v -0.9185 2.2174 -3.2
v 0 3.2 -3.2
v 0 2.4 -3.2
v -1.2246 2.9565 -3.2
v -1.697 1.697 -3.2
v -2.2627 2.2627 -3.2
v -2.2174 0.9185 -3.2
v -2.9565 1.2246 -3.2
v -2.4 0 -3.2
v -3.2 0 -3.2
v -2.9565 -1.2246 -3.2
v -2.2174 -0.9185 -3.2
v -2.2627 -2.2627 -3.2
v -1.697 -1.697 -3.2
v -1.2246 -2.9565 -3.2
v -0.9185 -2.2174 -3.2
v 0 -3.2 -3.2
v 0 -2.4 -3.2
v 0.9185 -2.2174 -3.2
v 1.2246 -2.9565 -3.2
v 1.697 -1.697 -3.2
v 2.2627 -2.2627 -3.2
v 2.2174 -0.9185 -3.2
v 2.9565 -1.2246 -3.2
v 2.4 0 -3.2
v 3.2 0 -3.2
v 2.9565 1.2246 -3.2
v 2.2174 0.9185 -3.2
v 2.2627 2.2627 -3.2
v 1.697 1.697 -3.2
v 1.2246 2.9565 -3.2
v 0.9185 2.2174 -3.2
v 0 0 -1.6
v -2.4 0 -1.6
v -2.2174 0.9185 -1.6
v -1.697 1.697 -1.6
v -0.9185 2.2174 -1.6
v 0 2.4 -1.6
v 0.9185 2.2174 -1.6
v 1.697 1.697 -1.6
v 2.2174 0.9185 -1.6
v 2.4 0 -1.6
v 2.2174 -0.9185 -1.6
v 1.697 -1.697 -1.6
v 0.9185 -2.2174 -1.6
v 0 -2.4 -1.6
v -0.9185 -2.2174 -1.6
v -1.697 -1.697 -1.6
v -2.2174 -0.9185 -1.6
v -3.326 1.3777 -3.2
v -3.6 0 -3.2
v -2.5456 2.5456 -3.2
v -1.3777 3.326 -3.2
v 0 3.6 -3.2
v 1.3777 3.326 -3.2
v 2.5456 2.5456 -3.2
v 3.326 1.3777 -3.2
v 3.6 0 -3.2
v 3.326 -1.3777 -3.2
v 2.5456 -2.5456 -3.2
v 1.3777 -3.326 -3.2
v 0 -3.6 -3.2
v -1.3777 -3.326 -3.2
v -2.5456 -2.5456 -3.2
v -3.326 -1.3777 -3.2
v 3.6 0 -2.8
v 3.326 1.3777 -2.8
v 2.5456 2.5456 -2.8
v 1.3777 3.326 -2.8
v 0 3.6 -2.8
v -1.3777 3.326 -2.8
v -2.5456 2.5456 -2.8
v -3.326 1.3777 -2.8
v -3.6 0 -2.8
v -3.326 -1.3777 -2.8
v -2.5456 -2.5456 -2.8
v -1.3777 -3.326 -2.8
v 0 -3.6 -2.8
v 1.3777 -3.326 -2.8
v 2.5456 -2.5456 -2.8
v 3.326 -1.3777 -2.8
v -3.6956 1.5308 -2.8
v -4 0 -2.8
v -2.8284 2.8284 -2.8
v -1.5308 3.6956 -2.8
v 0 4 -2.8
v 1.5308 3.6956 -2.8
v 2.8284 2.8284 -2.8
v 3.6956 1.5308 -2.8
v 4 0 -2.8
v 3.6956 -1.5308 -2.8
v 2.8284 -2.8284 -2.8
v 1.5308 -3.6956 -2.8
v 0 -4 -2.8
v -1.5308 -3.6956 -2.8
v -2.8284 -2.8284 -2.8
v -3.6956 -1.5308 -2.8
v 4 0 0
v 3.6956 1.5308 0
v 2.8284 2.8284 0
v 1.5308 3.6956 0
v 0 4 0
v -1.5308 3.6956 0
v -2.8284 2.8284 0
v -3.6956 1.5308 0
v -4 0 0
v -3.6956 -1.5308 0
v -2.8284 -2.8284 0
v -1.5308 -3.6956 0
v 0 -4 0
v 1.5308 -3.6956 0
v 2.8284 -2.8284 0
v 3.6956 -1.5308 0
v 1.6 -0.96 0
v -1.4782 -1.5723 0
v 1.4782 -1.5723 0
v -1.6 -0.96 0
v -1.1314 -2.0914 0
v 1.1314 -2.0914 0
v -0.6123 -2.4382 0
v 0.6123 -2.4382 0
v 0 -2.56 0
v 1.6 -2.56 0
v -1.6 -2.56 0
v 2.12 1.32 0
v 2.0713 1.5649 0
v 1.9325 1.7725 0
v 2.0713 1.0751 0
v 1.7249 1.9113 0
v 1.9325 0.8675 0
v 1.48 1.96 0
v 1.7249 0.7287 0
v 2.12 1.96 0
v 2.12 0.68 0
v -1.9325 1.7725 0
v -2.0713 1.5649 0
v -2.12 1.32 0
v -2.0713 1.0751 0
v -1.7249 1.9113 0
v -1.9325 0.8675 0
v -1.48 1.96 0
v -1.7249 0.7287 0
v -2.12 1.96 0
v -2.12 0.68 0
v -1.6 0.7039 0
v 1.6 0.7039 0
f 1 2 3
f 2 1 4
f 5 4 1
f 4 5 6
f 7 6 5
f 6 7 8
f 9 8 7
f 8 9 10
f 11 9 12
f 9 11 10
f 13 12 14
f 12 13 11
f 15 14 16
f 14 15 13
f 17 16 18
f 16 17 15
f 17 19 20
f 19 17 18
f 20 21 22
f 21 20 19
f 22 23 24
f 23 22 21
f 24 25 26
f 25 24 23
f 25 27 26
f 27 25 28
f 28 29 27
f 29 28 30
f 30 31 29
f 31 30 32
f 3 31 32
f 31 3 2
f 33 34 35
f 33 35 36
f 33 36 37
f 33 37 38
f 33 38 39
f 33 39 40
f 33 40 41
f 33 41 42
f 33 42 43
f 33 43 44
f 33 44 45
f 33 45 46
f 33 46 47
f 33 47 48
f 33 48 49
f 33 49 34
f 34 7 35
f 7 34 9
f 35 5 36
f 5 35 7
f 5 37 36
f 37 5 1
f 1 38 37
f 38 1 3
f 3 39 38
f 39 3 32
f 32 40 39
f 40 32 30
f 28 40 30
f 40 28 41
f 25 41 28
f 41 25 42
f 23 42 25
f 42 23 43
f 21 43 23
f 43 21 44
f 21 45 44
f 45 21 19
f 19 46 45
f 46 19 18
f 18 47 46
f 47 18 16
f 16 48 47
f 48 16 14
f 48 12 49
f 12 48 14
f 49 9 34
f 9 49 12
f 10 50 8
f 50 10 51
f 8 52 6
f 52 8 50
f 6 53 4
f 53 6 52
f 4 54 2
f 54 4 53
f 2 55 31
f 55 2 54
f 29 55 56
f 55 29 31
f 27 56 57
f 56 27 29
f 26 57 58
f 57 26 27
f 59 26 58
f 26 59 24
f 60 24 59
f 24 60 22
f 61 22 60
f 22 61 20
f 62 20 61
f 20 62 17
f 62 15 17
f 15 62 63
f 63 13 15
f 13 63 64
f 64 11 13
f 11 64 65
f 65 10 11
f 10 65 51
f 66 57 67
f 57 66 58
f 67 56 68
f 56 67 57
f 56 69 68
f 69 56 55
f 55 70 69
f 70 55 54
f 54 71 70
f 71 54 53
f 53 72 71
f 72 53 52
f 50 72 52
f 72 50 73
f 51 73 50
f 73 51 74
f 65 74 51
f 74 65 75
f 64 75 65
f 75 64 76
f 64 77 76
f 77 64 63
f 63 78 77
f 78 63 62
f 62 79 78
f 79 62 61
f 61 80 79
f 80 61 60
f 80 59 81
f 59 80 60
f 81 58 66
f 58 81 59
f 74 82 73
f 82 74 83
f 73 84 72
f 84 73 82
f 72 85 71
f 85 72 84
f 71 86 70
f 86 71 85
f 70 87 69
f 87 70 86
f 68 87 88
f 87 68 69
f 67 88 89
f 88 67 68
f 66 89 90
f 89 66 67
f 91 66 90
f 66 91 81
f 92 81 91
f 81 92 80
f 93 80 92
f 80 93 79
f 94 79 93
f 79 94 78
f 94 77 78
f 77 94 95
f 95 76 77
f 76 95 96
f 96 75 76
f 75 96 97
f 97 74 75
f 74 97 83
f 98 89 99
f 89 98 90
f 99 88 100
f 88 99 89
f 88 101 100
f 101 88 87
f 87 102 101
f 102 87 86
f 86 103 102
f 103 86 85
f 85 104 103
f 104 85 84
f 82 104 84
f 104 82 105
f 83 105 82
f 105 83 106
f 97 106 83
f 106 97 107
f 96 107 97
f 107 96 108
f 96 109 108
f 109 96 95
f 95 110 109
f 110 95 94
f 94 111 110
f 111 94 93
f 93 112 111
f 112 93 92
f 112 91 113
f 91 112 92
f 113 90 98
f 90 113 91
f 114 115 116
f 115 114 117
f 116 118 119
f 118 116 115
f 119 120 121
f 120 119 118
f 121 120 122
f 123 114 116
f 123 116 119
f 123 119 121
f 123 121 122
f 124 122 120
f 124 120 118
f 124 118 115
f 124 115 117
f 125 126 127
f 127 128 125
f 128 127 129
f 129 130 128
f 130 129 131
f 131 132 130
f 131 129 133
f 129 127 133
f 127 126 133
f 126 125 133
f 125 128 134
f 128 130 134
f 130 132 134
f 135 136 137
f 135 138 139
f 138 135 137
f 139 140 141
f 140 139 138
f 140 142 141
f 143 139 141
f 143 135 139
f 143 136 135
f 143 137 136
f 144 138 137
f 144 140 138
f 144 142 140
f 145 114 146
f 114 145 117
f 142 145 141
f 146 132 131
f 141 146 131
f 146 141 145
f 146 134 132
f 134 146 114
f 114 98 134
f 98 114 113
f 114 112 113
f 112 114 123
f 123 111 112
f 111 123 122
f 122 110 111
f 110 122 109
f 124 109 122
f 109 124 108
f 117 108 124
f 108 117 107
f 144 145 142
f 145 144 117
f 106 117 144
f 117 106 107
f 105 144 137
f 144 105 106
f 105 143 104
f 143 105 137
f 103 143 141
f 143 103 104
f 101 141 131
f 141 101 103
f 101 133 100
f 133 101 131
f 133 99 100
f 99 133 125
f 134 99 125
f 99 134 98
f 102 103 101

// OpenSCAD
// file: ../p/4-4disc.scad
use <../lib.scad>
function ldraw_lib__4_4disc() = [
// 0 Disc 1.0
// 0 Name: 4-4disc.dat
// 0 Author: James Jessiman
// 0 !LDRAW_ORG Primitive UPDATE 2002-02
// 0 !LICENSE Licensed under CC BY 2.0 and CC BY 4.0 : see CAreadme.txt
// 
// 0 BFC CERTIFY CCW
  [0,"BFC","CERTIFY"],
  [0,"BFC","CCW"],
// 
// 0 !HISTORY 1998-12-15 [PTadmin] Official Update 1998-10
// 0 !HISTORY 2002-03-23 [sbliss] Added BFC statement
// 0 !HISTORY 2002-04-25 [PTadmin] Official Update 2002-02
// 0 !HISTORY 2007-06-24 [PTadmin] Header formatted for Contributor Agreement
// 0 !HISTORY 2008-07-01 [PTadmin] Official Update 2008-01
// 
// 
// 3 16 0 0 0 1 0 0 0.9239 0 0.3827
  [3,16,0,0,0,1,0,0,0.9239,0,0.3827],
// 3 16 0 0 0 0.9239 0 0.3827 0.7071 0 0.7071
  [3,16,0,0,0,0.9239,0,0.3827,0.7071,0,0.7071],
// 3 16 0 0 0 0.7071 0 0.7071 0.3827 0 0.9239
  [3,16,0,0,0,0.7071,0,0.7071,0.3827,0,0.9239],
// 3 16 0 0 0 0.3827 0 0.9239 0 0 1
  [3,16,0,0,0,0.3827,0,0.9239,0,0,1],
// 3 16 0 0 0 0 0 1 -0.3827 0 0.9239
  [3,16,0,0,0,0,0,1,-0.3827,0,0.9239],
// 3 16 0 0 0 -0.3827 0 0.9239 -0.7071 0 0.7071
  [3,16,0,0,0,-0.3827,0,0.9239,-0.7071,0,0.7071],
// 3 16 0 0 0 -0.7071 0 0.7071 -0.9239 0 0.3827
  [3,16,0,0,0,-0.7071,0,0.7071,-0.9239,0,0.3827],
// 3 16 0 0 0 -0.9239 0 0.3827 -1 0 -0
  [3,16,0,0,0,-0.9239,0,0.3827,-1,0,-0],
// 3 16 0 0 0 -1 0 -0 -0.9239 0 -0.3827
  [3,16,0,0,0,-1,0,-0,-0.9239,0,-0.3827],
// 3 16 0 0 0 -0.9239 0 -0.3827 -0.7071 0 -0.7071
  [3,16,0,0,0,-0.9239,0,-0.3827,-0.7071,0,-0.7071],
// 3 16 0 0 0 -0.7071 0 -0.7071 -0.3827 0 -0.9239
  [3,16,0,0,0,-0.7071,0,-0.7071,-0.3827,0,-0.9239],
// 3 16 0 0 0 -0.3827 0 -0.9239 0 0 -1
  [3,16,0,0,0,-0.3827,0,-0.9239,0,0,-1],
// 3 16 0 0 0 0 0 -1 0.3827 0 -0.9239
  [3,16,0,0,0,0,0,-1,0.3827,0,-0.9239],
// 3 16 0 0 0 0.3827 0 -0.9239 0.7071 0 -0.7071
  [3,16,0,0,0,0.3827,0,-0.9239,0.7071,0,-0.7071],
// 3 16 0 0 0 0.7071 0 -0.7071 0.9239 0 -0.3827
  [3,16,0,0,0,0.7071,0,-0.7071,0.9239,0,-0.3827],
// 3 16 0 0 0 0.9239 0 -0.3827 1 0 0
  [3,16,0,0,0,0.9239,0,-0.3827,1,0,0],
// 0
];
makepoly(ldraw_lib__4_4disc(), line=0.2);
// file: ../p/4-4ring3.scad
use <../lib.scad>
function ldraw_lib__4_4ring3() = [
// 0 Ring  3 x 1.0
// 0 Name: 4-4ring3.dat
// 0 Author: James Jessiman
// 0 !LDRAW_ORG Primitive UPDATE 2009-01
// 0 !LICENSE Licensed under CC BY 2.0 and CC BY 4.0 : see CAreadme.txt
// 
// 0 BFC CERTIFY CCW
  [0,"BFC","CERTIFY"],
  [0,"BFC","CCW"],
// 
// 0 !HISTORY 1998-12-15 [PTadmin] Official Update 1998-10
// 0 !HISTORY 2002-04-05 [hafhead] Added BFC statement
// 0 !HISTORY 2002-04-25 [PTadmin] Official Update 2002-02
// 0 !HISTORY 2007-06-24 [PTadmin] Header formatted for Contributor Agreement
// 0 !HISTORY 2008-07-01 [PTadmin] Official Update 2008-01
// 0 !HISTORY 2008-08-26 [cwdee] Switch polygon winding and rename
// 0 !HISTORY 2009-05-02 [PTadmin] Official Update 2009-01
// 
// 
// 4 16 -1.5308 0 3.6956 -1.1481 0 2.7717 0 0 3 0 0 4
  [4,16,-1.5308,0,3.6956,-1.1481,0,2.7717,0,0,3,0,0,4],
// 4 16 -2.8284 0 2.8284 -2.1213 0 2.1213 -1.1481 0 2.7717 -1.5308 0 3.6956
  [4,16,-2.8284,0,2.8284,-2.1213,0,2.1213,-1.1481,0,2.7717,-1.5308,0,3.6956],
// 4 16 -3.6956 0 1.5308 -2.7717 0 1.1481 -2.1213 0 2.1213 -2.8284 0 2.8284
  [4,16,-3.6956,0,1.5308,-2.7717,0,1.1481,-2.1213,0,2.1213,-2.8284,0,2.8284],
// 4 16 -4 0 0 -3 0 0 -2.7717 0 1.1481 -3.6956 0 1.5308
  [4,16,-4,0,0,-3,0,0,-2.7717,0,1.1481,-3.6956,0,1.5308],
// 4 16 -3.6956 0 -1.5308 -2.7717 0 -1.1481 -3 0 0 -4 0 0
  [4,16,-3.6956,0,-1.5308,-2.7717,0,-1.1481,-3,0,0,-4,0,0],
// 4 16 -2.8284 0 -2.8284 -2.1213 0 -2.1213 -2.7717 0 -1.1481 -3.6956 0 -1.5308
  [4,16,-2.8284,0,-2.8284,-2.1213,0,-2.1213,-2.7717,0,-1.1481,-3.6956,0,-1.5308],
// 4 16 -1.5308 0 -3.6956 -1.1481 0 -2.7717 -2.1213 0 -2.1213 -2.8284 0 -2.8284
  [4,16,-1.5308,0,-3.6956,-1.1481,0,-2.7717,-2.1213,0,-2.1213,-2.8284,0,-2.8284],
// 4 16 0 0 -4 0 0 -3 -1.1481 0 -2.7717 -1.5308 0 -3.6956
  [4,16,0,0,-4,0,0,-3,-1.1481,0,-2.7717,-1.5308,0,-3.6956],
// 4 16 1.5308 0 -3.6956 1.1481 0 -2.7717 0 0 -3 0 0 -4
  [4,16,1.5308,0,-3.6956,1.1481,0,-2.7717,0,0,-3,0,0,-4],
// 4 16 2.8284 0 -2.8284 2.1213 0 -2.1213 1.1481 0 -2.7717 1.5308 0 -3.6956
  [4,16,2.8284,0,-2.8284,2.1213,0,-2.1213,1.1481,0,-2.7717,1.5308,0,-3.6956],
// 4 16 3.6956 0 -1.5308 2.7717 0 -1.1481 2.1213 0 -2.1213 2.8284 0 -2.8284
  [4,16,3.6956,0,-1.5308,2.7717,0,-1.1481,2.1213,0,-2.1213,2.8284,0,-2.8284],
// 4 16 4 0 0 3 0 0 2.7717 0 -1.1481 3.6956 0 -1.5308
  [4,16,4,0,0,3,0,0,2.7717,0,-1.1481,3.6956,0,-1.5308],
// 4 16 3.6956 0 1.5308 2.7717 0 1.1481 3 0 0 4 0 0
  [4,16,3.6956,0,1.5308,2.7717,0,1.1481,3,0,0,4,0,0],
// 4 16 2.8284 0 2.8284 2.1213 0 2.1213 2.7717 0 1.1481 3.6956 0 1.5308
  [4,16,2.8284,0,2.8284,2.1213,0,2.1213,2.7717,0,1.1481,3.6956,0,1.5308],
// 4 16 1.5308 0 3.6956 1.1481 0 2.7717 2.1213 0 2.1213 2.8284 0 2.8284
  [4,16,1.5308,0,3.6956,1.1481,0,2.7717,2.1213,0,2.1213,2.8284,0,2.8284],
// 4 16 0 0 4 0 0 3 1.1481 0 2.7717 1.5308 0 3.6956
  [4,16,0,0,4,0,0,3,1.1481,0,2.7717,1.5308,0,3.6956],
// 0
];
makepoly(ldraw_lib__4_4ring3(), line=0.2);
// file: ../p/4-4cylc.scad
use <../lib.scad>
use <4-4cyli.scad>
use <4-4disc.scad>
use <4-4edge.scad>
function ldraw_lib__4_4cylc() = [
// 0 Cylinder Closed 1.0
// 0 Name: 4-4cylc.dat
// 0 Author: Alex Taylor [anathema]
// 0 !LDRAW_ORG Primitive UPDATE 2009-02
// 0 !LICENSE Licensed under CC BY 2.0 and CC BY 4.0 : see CAreadme.txt
// 
// 0 BFC CERTIFY CCW
  [0,"BFC","CERTIFY"],
  [0,"BFC","CCW"],
// 
// 0 !HISTORY 2008-12-29 [cwdee] Removed one disc
// 0 !HISTORY 2009-09-03 [PTadmin] Official Update 2009-02
// 
// 
// 1 16 0 0 0 1 0 0 0 1 0 0 0 1 4-4edge.dat
  [1,16,0,0,0,1,0,0,0,1,0,0,0,1, ldraw_lib__4_4edge()],
// 1 16 0 1 0 1 0 0 0 1 0 0 0 1 4-4edge.dat
  [1,16,0,1,0,1,0,0,0,1,0,0,0,1, ldraw_lib__4_4edge()],
// 1 16 0 0 0 1 0 0 0 1 0 0 0 1 4-4disc.dat
  [1,16,0,0,0,1,0,0,0,1,0,0,0,1, ldraw_lib__4_4disc()],
// 1 16 0 0 0 1 0 0 0 1 0 0 0 1 4-4cyli.dat
  [1,16,0,0,0,1,0,0,0,1,0,0,0,1, ldraw_lib__4_4cyli()],
// 0
];
makepoly(ldraw_lib__4_4cylc(), line=0.2);
// file: ../p/4-4edge.scad
use <../lib.scad>
function ldraw_lib__4_4edge() = [
// 0 Circle 1.0
// 0 Name: 4-4edge.dat
// 0 Author: James Jessiman
// 0 !LDRAW_ORG Primitive UPDATE 2017-01
// 0 !LICENSE Licensed under CC BY 2.0 and CC BY 4.0 : see CAreadme.txt
// 
// 0 BFC CERTIFY CCW
  [0,"BFC","CERTIFY"],
  [0,"BFC","CCW"],
// 
// 0 !HISTORY 1998-12-15 [PTadmin] Official Update 1998-10
// 0 !HISTORY 2005-12-28 [PTadmin] Official Update 2005-01
// 0 !HISTORY 2007-06-24 [PTadmin] Header formatted for Contributor Agreement
// 0 !HISTORY 2008-07-01 [PTadmin] Official Update 2008-01
// 0 !HISTORY 2017-01-15 [Steffen] BFCed
// 0 !HISTORY 2017-12-30 [PTadmin] Official Update 2017-01
// 
// 
// 2 24 1 0 0 0.9239 0 0.3827
  [2,24,1,0,0,0.9239,0,0.3827],
// 2 24 0.9239 0 0.3827 0.7071 0 0.7071
  [2,24,0.9239,0,0.3827,0.7071,0,0.7071],
// 2 24 0.7071 0 0.7071 0.3827 0 0.9239
  [2,24,0.7071,0,0.7071,0.3827,0,0.9239],
// 2 24 0.3827 0 0.9239 0 0 1
  [2,24,0.3827,0,0.9239,0,0,1],
// 2 24 0 0 1 -0.3827 0 0.9239
  [2,24,0,0,1,-0.3827,0,0.9239],
// 2 24 -0.3827 0 0.9239 -0.7071 0 0.7071
  [2,24,-0.3827,0,0.9239,-0.7071,0,0.7071],
// 2 24 -0.7071 0 0.7071 -0.9239 0 0.3827
  [2,24,-0.7071,0,0.7071,-0.9239,0,0.3827],
// 2 24 -0.9239 0 0.3827 -1 0 -0
  [2,24,-0.9239,0,0.3827,-1,0,-0],
// 2 24 -1 0 -0 -0.9239 0 -0.3827
  [2,24,-1,0,-0,-0.9239,0,-0.3827],
// 2 24 -0.9239 0 -0.3827 -0.7071 0 -0.7071
  [2,24,-0.9239,0,-0.3827,-0.7071,0,-0.7071],
// 2 24 -0.7071 0 -0.7071 -0.3827 0 -0.9239
  [2,24,-0.7071,0,-0.7071,-0.3827,0,-0.9239],
// 2 24 -0.3827 0 -0.9239 0 0 -1
  [2,24,-0.3827,0,-0.9239,0,0,-1],
// 2 24 0 0 -1 0.3827 0 -0.9239
  [2,24,0,0,-1,0.3827,0,-0.9239],
// 2 24 0.3827 0 -0.9239 0.7071 0 -0.7071
  [2,24,0.3827,0,-0.9239,0.7071,0,-0.7071],
// 2 24 0.7071 0 -0.7071 0.9239 0 -0.3827
  [2,24,0.7071,0,-0.7071,0.9239,0,-0.3827],
// 2 24 0.9239 0 -0.3827 1 0 0
  [2,24,0.9239,0,-0.3827,1,0,0],
];
makepoly(ldraw_lib__4_4edge(), line=0.2);
// file: ../p/4-4cyli.scad
use <../lib.scad>
function ldraw_lib__4_4cyli() = [
// 0 Cylinder 1.0
// 0 Name: 4-4cyli.dat
// 0 Author: James Jessiman
// 0 !LDRAW_ORG Primitive UPDATE 2005-01
// 0 !LICENSE Licensed under CC BY 2.0 and CC BY 4.0 : see CAreadme.txt
// 
// 0 BFC CERTIFY CCW
  [0,"BFC","CERTIFY"],
  [0,"BFC","CCW"],
// 
// 0 !HISTORY 1998-12-15 [PTadmin] Official Update 1998-10
// 0 !HISTORY 2002-03-23 [sbliss] Added BFC statement; merged headers from files in distributions LDraw 0.27 and Complete.
// 0 !HISTORY 2002-04-25 [PTadmin] Official Update 2002-02
// 0 !HISTORY 2004-12-14 [guyvivan] BFC CCW
// 0 !HISTORY 2005-12-28 [PTadmin] Official Update 2005-01
// 0 !HISTORY 2007-06-24 [PTadmin] Header formatted for Contributor Agreement
// 0 !HISTORY 2008-07-01 [PTadmin] Official Update 2008-01
// 
// 
// 4 16 1 1 0 0.9239 1 0.3827 0.9239 0 0.3827 1 0 0
  [4,16,1,1,0,0.9239,1,0.3827,0.9239,0,0.3827,1,0,0],
// 5 24 1 0 0 1 1 0 0.9239 0 0.3827 0.9239 0 -0.3827
  [5,24,1,0,0,1,1,0,0.9239,0,0.3827,0.9239,0,-0.3827],
// 4 16 0.9239 1 0.3827 0.7071 1 0.7071 0.7071 0 0.7071 0.9239 0 0.3827
  [4,16,0.9239,1,0.3827,0.7071,1,0.7071,0.7071,0,0.7071,0.9239,0,0.3827],
// 5 24 0.9239 0 0.3827 0.9239 1 0.3827 0.7071 0 0.7071 1 0 0
  [5,24,0.9239,0,0.3827,0.9239,1,0.3827,0.7071,0,0.7071,1,0,0],
// 4 16 0.7071 1 0.7071 0.3827 1 0.9239 0.3827 0 0.9239 0.7071 0 0.7071
  [4,16,0.7071,1,0.7071,0.3827,1,0.9239,0.3827,0,0.9239,0.7071,0,0.7071],
// 5 24 0.7071 0 0.7071 0.7071 1 0.7071 0.3827 0 0.9239 0.9239 0 0.3827
  [5,24,0.7071,0,0.7071,0.7071,1,0.7071,0.3827,0,0.9239,0.9239,0,0.3827],
// 4 16 0.3827 1 0.9239 0 1 1 0 0 1 0.3827 0 0.9239
  [4,16,0.3827,1,0.9239,0,1,1,0,0,1,0.3827,0,0.9239],
// 5 24 0.3827 0 0.9239 0.3827 1 0.9239 0 0 1 0.7071 0 0.7071
  [5,24,0.3827,0,0.9239,0.3827,1,0.9239,0,0,1,0.7071,0,0.7071],
// 4 16 0 1 1 -0.3827 1 0.9239 -0.3827 0 0.9239 0 0 1
  [4,16,0,1,1,-0.3827,1,0.9239,-0.3827,0,0.9239,0,0,1],
// 5 24 0 0 1 0 1 1 -0.3827 0 0.9239 0.3827 0 0.9239
  [5,24,0,0,1,0,1,1,-0.3827,0,0.9239,0.3827,0,0.9239],
// 4 16 -0.3827 1 0.9239 -0.7071 1 0.7071 -0.7071 0 0.7071 -0.3827 0 0.9239
  [4,16,-0.3827,1,0.9239,-0.7071,1,0.7071,-0.7071,0,0.7071,-0.3827,0,0.9239],
// 5 24 -0.3827 0 0.9239 -0.3827 1 0.9239 -0.7071 0 0.7071 0 0 1
  [5,24,-0.3827,0,0.9239,-0.3827,1,0.9239,-0.7071,0,0.7071,0,0,1],
// 4 16 -0.7071 1 0.7071 -0.9239 1 0.3827 -0.9239 0 0.3827 -0.7071 0 0.7071
  [4,16,-0.7071,1,0.7071,-0.9239,1,0.3827,-0.9239,0,0.3827,-0.7071,0,0.7071],
// 5 24 -0.7071 0 0.7071 -0.7071 1 0.7071 -0.9239 0 0.3827 -0.3827 0 0.9239
  [5,24,-0.7071,0,0.7071,-0.7071,1,0.7071,-0.9239,0,0.3827,-0.3827,0,0.9239],
// 4 16 -0.9239 1 0.3827 -1 1 0 -1 0 0 -0.9239 0 0.3827
  [4,16,-0.9239,1,0.3827,-1,1,0,-1,0,0,-0.9239,0,0.3827],
// 5 24 -0.9239 0 0.3827 -0.9239 1 0.3827 -1 0 0 -0.7071 0 0.7071
  [5,24,-0.9239,0,0.3827,-0.9239,1,0.3827,-1,0,0,-0.7071,0,0.7071],
// 4 16 -1 1 0 -0.9239 1 -0.3827 -0.9239 0 -0.3827 -1 0 0
  [4,16,-1,1,0,-0.9239,1,-0.3827,-0.9239,0,-0.3827,-1,0,0],
// 5 24 -1 0 0 -1 1 0 -0.9239 0 -0.3827 -0.9239 0 0.3827
  [5,24,-1,0,0,-1,1,0,-0.9239,0,-0.3827,-0.9239,0,0.3827],
// 4 16 -0.9239 1 -0.3827 -0.7071 1 -0.7071 -0.7071 0 -0.7071 -0.9239 0 -0.3827
  [4,16,-0.9239,1,-0.3827,-0.7071,1,-0.7071,-0.7071,0,-0.7071,-0.9239,0,-0.3827],
// 5 24 -0.9239 0 -0.3827 -0.9239 1 -0.3827 -0.7071 0 -0.7071 -1 0 0
  [5,24,-0.9239,0,-0.3827,-0.9239,1,-0.3827,-0.7071,0,-0.7071,-1,0,0],
// 4 16 -0.7071 1 -0.7071 -0.3827 1 -0.9239 -0.3827 0 -0.9239 -0.7071 0 -0.7071
  [4,16,-0.7071,1,-0.7071,-0.3827,1,-0.9239,-0.3827,0,-0.9239,-0.7071,0,-0.7071],
// 5 24 -0.7071 0 -0.7071 -0.7071 1 -0.7071 -0.3827 0 -0.9239 -0.9239 0 -0.3827
  [5,24,-0.7071,0,-0.7071,-0.7071,1,-0.7071,-0.3827,0,-0.9239,-0.9239,0,-0.3827],
// 4 16 -0.3827 1 -0.9239 0 1 -1 0 0 -1 -0.3827 0 -0.9239
  [4,16,-0.3827,1,-0.9239,0,1,-1,0,0,-1,-0.3827,0,-0.9239],
// 5 24 -0.3827 0 -0.9239 -0.3827 1 -0.9239 0 0 -1 -0.7071 0 -0.7071
  [5,24,-0.3827,0,-0.9239,-0.3827,1,-0.9239,0,0,-1,-0.7071,0,-0.7071],
// 4 16 0 1 -1 0.3827 1 -0.9239 0.3827 0 -0.9239 0 0 -1
  [4,16,0,1,-1,0.3827,1,-0.9239,0.3827,0,-0.9239,0,0,-1],
// 5 24 0 0 -1 0 1 -1 0.3827 0 -0.9239 -0.3827 0 -0.9239
  [5,24,0,0,-1,0,1,-1,0.3827,0,-0.9239,-0.3827,0,-0.9239],
// 4 16 0.3827 1 -0.9239 0.7071 1 -0.7071 0.7071 0 -0.7071 0.3827 0 -0.9239
  [4,16,0.3827,1,-0.9239,0.7071,1,-0.7071,0.7071,0,-0.7071,0.3827,0,-0.9239],
// 5 24 0.3827 0 -0.9239 0.3827 1 -0.9239 0.7071 0 -0.7071 0 0 -1
  [5,24,0.3827,0,-0.9239,0.3827,1,-0.9239,0.7071,0,-0.7071,0,0,-1],
// 4 16 0.7071 1 -0.7071 0.9239 1 -0.3827 0.9239 0 -0.3827 0.7071 0 -0.7071
  [4,16,0.7071,1,-0.7071,0.9239,1,-0.3827,0.9239,0,-0.3827,0.7071,0,-0.7071],
// 5 24 0.7071 0 -0.7071 0.7071 1 -0.7071 0.9239 0 -0.3827 0.3827 0 -0.9239
  [5,24,0.7071,0,-0.7071,0.7071,1,-0.7071,0.9239,0,-0.3827,0.3827,0,-0.9239],
// 4 16 0.9239 1 -0.3827 1 1 0 1 0 0 0.9239 0 -0.3827
  [4,16,0.9239,1,-0.3827,1,1,0,1,0,0,0.9239,0,-0.3827],
// 5 24 0.9239 0 -0.3827 0.9239 1 -0.3827 1 0 0 0.7071 0 -0.7071
  [5,24,0.9239,0,-0.3827,0.9239,1,-0.3827,1,0,0,0.7071,0,-0.7071],
// 0
];
makepoly(ldraw_lib__4_4cyli(), line=0.2);
// file: ../p/empty.scad
use <../lib.scad>
function ldraw_lib__empty() = [
// 0 Empty
// 0 Name: empty.dat
// 0 Author: Steffen [Steffen]
// 0 !LDRAW_ORG Primitive UPDATE 2015-01
// 0 !LICENSE Licensed under CC BY 2.0 and CC BY 4.0 : see CAreadme.txt
// 
// 0 BFC CERTIFY CCW
  [0,"BFC","CERTIFY"],
  [0,"BFC","CCW"],
// 
// 0 !HISTORY 2015-10-11 [PTadmin] Official Update 2015-01
// 
// 
// 0 // Tool MLCad cannot handle really empty files. This file is used as a workaround.
// 0 // It exceptionally contains forbidden non-LDRAW standard syntax to satisfy MLCad until it is fixed OR a different editor has become the de-facto LDRAW standard.
// 0 // The line being used here is an "impossible" conditional line which never should be visible,
// 0 // additionally hidden by a syntax explicitly hiding it from displaying.
// 
// 0 MLCAD HIDE 5 24 0 0 0 0.0001 0 0 0.0001 -0.0001 0 0 0 0
];
makepoly(ldraw_lib__empty(), line=0.2);
// file: ../p/stud4o.scad
use <../lib.scad>
use <4-4cylc.scad>
use <4-4ring3.scad>
function ldraw_lib__stud4o() = [
// 0 Stud Tube Open without Outer Cylinder
// 0 Name: stud4o.dat
// 0 Author: Magnus Forsberg [MagFors]
// 0 !LDRAW_ORG Primitive UPDATE 2011-02
// 0 !LICENSE Licensed under CC BY 2.0 and CC BY 4.0 : see CAreadme.txt
// 
// 0 !HELP This stud is a "antistud" to be used like a underside stud,
// 0 !HELP but without the outer cylinder.
// 0 !HELP 1 47 0 0 0 1 0 0 0 1 0 0 0 1 stud4.dat
// 
// 0 BFC CERTIFY CCW
  [0,"BFC","CERTIFY"],
  [0,"BFC","CCW"],
// 
// 0 !HISTORY 2011-12-29 [PTadmin] Official Update 2011-02
// 
// 
// 1 16 0 -4 0 2 0 0 0 1 0 0 0 2 4-4ring3.dat
  [1,16,0,-4,0,2,0,0,0,1,0,0,0,2, ldraw_lib__4_4ring3()],
// 0 BFC INVERTNEXT
  [0,"BFC","INVERTNEXT"],
// 1 16 0 0 0 -6 0 0 0 -4 0 0 0 6 4-4cylc.dat
  [1,16,0,0,0,-6,0,0,0,-4,0,0,0,6, ldraw_lib__4_4cylc()],
];
makepoly(ldraw_lib__stud4o(), line=0.2);
// file: ../p/4-4ring9.scad
use <../lib.scad>
function ldraw_lib__4_4ring9() = [
// 0 Ring  9 x 1.0
// 0 Name: 4-4ring9.dat
// 0 Author: John Riley [jriley]
// 0 !LDRAW_ORG Primitive UPDATE 2004-02
// 0 !LICENSE Licensed under CC BY 2.0 and CC BY 4.0 : see CAreadme.txt
// 
// 0 BFC CERTIFY CCW
  [0,"BFC","CERTIFY"],
  [0,"BFC","CCW"],
// 
// 0 !HISTORY 2004-04-22 [PTadmin] Official Update 2004-02
// 0 !HISTORY 2007-06-24 [PTadmin] Header formatted for Contributor Agreement
// 0 !HISTORY 2008-07-01 [PTadmin] Official Update 2008-01
// 
// 
// 4 16 9 0 0 10 0 0 9.239 0 3.827 8.3151 0 3.4443
  [4,16,9,0,0,10,0,0,9.239,0,3.827,8.3151,0,3.4443],
// 4 16 8.3151 0 3.4443 9.239 0 3.827 7.071 0 7.071 6.3639 0 6.3639
  [4,16,8.3151,0,3.4443,9.239,0,3.827,7.071,0,7.071,6.3639,0,6.3639],
// 4 16 6.3639 0 6.3639 7.071 0 7.071 3.827 0 9.239 3.4443 0 8.3151
  [4,16,6.3639,0,6.3639,7.071,0,7.071,3.827,0,9.239,3.4443,0,8.3151],
// 4 16 3.4443 0 8.3151 3.827 0 9.239 0 0 10 0 0 9
  [4,16,3.4443,0,8.3151,3.827,0,9.239,0,0,10,0,0,9],
// 4 16 0 0 9 0 0 10 -3.827 0 9.239 -3.4443 0 8.3151
  [4,16,0,0,9,0,0,10,-3.827,0,9.239,-3.4443,0,8.3151],
// 4 16 -3.4443 0 8.3151 -3.827 0 9.239 -7.071 0 7.071 -6.3639 0 6.3639
  [4,16,-3.4443,0,8.3151,-3.827,0,9.239,-7.071,0,7.071,-6.3639,0,6.3639],
// 4 16 -6.3639 0 6.3639 -7.071 0 7.071 -9.239 0 3.827 -8.3151 0 3.4443
  [4,16,-6.3639,0,6.3639,-7.071,0,7.071,-9.239,0,3.827,-8.3151,0,3.4443],
// 4 16 -8.3151 0 3.4443 -9.239 0 3.827 -10 0 0 -9 0 0
  [4,16,-8.3151,0,3.4443,-9.239,0,3.827,-10,0,0,-9,0,0],
// 4 16 -9 0 0 -10 0 0 -9.239 0 -3.827 -8.3151 0 -3.4443
  [4,16,-9,0,0,-10,0,0,-9.239,0,-3.827,-8.3151,0,-3.4443],
// 4 16 -8.3151 0 -3.4443 -9.239 0 -3.827 -7.071 0 -7.071 -6.3639 0 -6.3639
  [4,16,-8.3151,0,-3.4443,-9.239,0,-3.827,-7.071,0,-7.071,-6.3639,0,-6.3639],
// 4 16 -6.3639 0 -6.3639 -7.071 0 -7.071 -3.827 0 -9.239 -3.4443 0 -8.3151
  [4,16,-6.3639,0,-6.3639,-7.071,0,-7.071,-3.827,0,-9.239,-3.4443,0,-8.3151],
// 4 16 -3.4443 0 -8.3151 -3.827 0 -9.239 0 0 -10 0 0 -9
  [4,16,-3.4443,0,-8.3151,-3.827,0,-9.239,0,0,-10,0,0,-9],
// 4 16 0 0 -9 0 0 -10 3.827 0 -9.239 3.4443 0 -8.3151
  [4,16,0,0,-9,0,0,-10,3.827,0,-9.239,3.4443,0,-8.3151],
// 4 16 3.4443 0 -8.3151 3.827 0 -9.239 7.071 0 -7.071 6.3639 0 -6.3639
  [4,16,3.4443,0,-8.3151,3.827,0,-9.239,7.071,0,-7.071,6.3639,0,-6.3639],
// 4 16 6.3639 0 -6.3639 7.071 0 -7.071 9.239 0 -3.827 8.3151 0 -3.4443
  [4,16,6.3639,0,-6.3639,7.071,0,-7.071,9.239,0,-3.827,8.3151,0,-3.4443],
// 4 16 8.3151 0 -3.4443 9.239 0 -3.827 10 0 0 9 0 0
  [4,16,8.3151,0,-3.4443,9.239,0,-3.827,10,0,0,9,0,0],
// 0
];
makepoly(ldraw_lib__4_4ring9(), line=0.2);
// file: ../p/4-4ring8.scad
use <../lib.scad>
function ldraw_lib__4_4ring8() = [
// 0 Ring  8 x 1.0
// 0 Name: 4-4ring8.dat
// 0 Author: Steffen [Steffen]
// 0 !LDRAW_ORG Primitive UPDATE 2012-01
// 0 !LICENSE Licensed under CC BY 2.0 and CC BY 4.0 : see CAreadme.txt
// 
// 0 BFC CERTIFY CCW
  [0,"BFC","CERTIFY"],
  [0,"BFC","CCW"],
// 
// 0 !HISTORY 2003-12-19 [PTadmin] Official Update 2003-03
// 0 !HISTORY 2007-06-24 [PTadmin] Header formatted for Contributor Agreement
// 0 !HISTORY 2008-07-01 [PTadmin] Official Update 2008-01
// 0 !HISTORY 2012-02-16 [Philo] Changed to CCW
// 0 !HISTORY 2012-03-30 [PTadmin] Official Update 2012-01
// 
// 
// 4 16 9 0 0 8.3151 0 3.4443 7.3912 0 3.0616 8 0 0
  [4,16,9,0,0,8.3151,0,3.4443,7.3912,0,3.0616,8,0,0],
// 4 16 8.3151 0 3.4443 6.3639 0 6.3639 5.6568 0 5.6568 7.3912 0 3.0616
  [4,16,8.3151,0,3.4443,6.3639,0,6.3639,5.6568,0,5.6568,7.3912,0,3.0616],
// 4 16 6.3639 0 6.3639 3.4443 0 8.3151 3.0616 0 7.3912 5.6568 0 5.6568
  [4,16,6.3639,0,6.3639,3.4443,0,8.3151,3.0616,0,7.3912,5.6568,0,5.6568],
// 4 16 3.4443 0 8.3151 0 0 9 0 0 8 3.0616 0 7.3912
  [4,16,3.4443,0,8.3151,0,0,9,0,0,8,3.0616,0,7.3912],
// 4 16 0 0 9 -3.4443 0 8.3151 -3.0616 0 7.3912 0 0 8
  [4,16,0,0,9,-3.4443,0,8.3151,-3.0616,0,7.3912,0,0,8],
// 4 16 -3.4443 0 8.3151 -6.3639 0 6.3639 -5.6568 0 5.6568 -3.0616 0 7.3912
  [4,16,-3.4443,0,8.3151,-6.3639,0,6.3639,-5.6568,0,5.6568,-3.0616,0,7.3912],
// 4 16 -6.3639 0 6.3639 -8.3151 0 3.4443 -7.3912 0 3.0616 -5.6568 0 5.6568
  [4,16,-6.3639,0,6.3639,-8.3151,0,3.4443,-7.3912,0,3.0616,-5.6568,0,5.6568],
// 4 16 -8.3151 0 3.4443 -9 0 0 -8 0 0 -7.3912 0 3.0616
  [4,16,-8.3151,0,3.4443,-9,0,0,-8,0,0,-7.3912,0,3.0616],
// 4 16 -9 0 0 -8.3151 0 -3.4443 -7.3912 0 -3.0616 -8 0 0
  [4,16,-9,0,0,-8.3151,0,-3.4443,-7.3912,0,-3.0616,-8,0,0],
// 4 16 -8.3151 0 -3.4443 -6.3639 0 -6.3639 -5.6568 0 -5.6568 -7.3912 0 -3.0616
  [4,16,-8.3151,0,-3.4443,-6.3639,0,-6.3639,-5.6568,0,-5.6568,-7.3912,0,-3.0616],
// 4 16 -6.3639 0 -6.3639 -3.4443 0 -8.3151 -3.0616 0 -7.3912 -5.6568 0 -5.6568
  [4,16,-6.3639,0,-6.3639,-3.4443,0,-8.3151,-3.0616,0,-7.3912,-5.6568,0,-5.6568],
// 4 16 -3.4443 0 -8.3151 0 0 -9 0 0 -8 -3.0616 0 -7.3912
  [4,16,-3.4443,0,-8.3151,0,0,-9,0,0,-8,-3.0616,0,-7.3912],
// 4 16 0 0 -9 3.4443 0 -8.3151 3.0616 0 -7.3912 0 0 -8
  [4,16,0,0,-9,3.4443,0,-8.3151,3.0616,0,-7.3912,0,0,-8],
// 4 16 3.4443 0 -8.3151 6.3639 0 -6.3639 5.6568 0 -5.6568 3.0616 0 -7.3912
  [4,16,3.4443,0,-8.3151,6.3639,0,-6.3639,5.6568,0,-5.6568,3.0616,0,-7.3912],
// 4 16 6.3639 0 -6.3639 8.3151 0 -3.4443 7.3912 0 -3.0616 5.6568 0 -5.6568
  [4,16,6.3639,0,-6.3639,8.3151,0,-3.4443,7.3912,0,-3.0616,5.6568,0,-5.6568],
// 4 16 8.3151 0 -3.4443 9 0 0 8 0 0 7.3912 0 -3.0616
  [4,16,8.3151,0,-3.4443,9,0,0,8,0,0,7.3912,0,-3.0616],
];
makepoly(ldraw_lib__4_4ring8(), line=0.2);
// file: ../p/4-4cylo.scad
use <../lib.scad>
use <4-4cyli.scad>
use <4-4edge.scad>
function ldraw_lib__4_4cylo() = [
// 0 Cylinder Open 1.0
// 0 Name: 4-4cylo.dat
// 0 Author: Mark Kennedy [mkennedy]
// 0 !LDRAW_ORG Primitive UPDATE 2010-01
// 0 !LICENSE Licensed under CC BY 2.0 and CC BY 4.0 : see CAreadme.txt
// 
// 0 BFC CERTIFY CCW
  [0,"BFC","CERTIFY"],
  [0,"BFC","CCW"],
// 
// 0 !HISTORY 2010-04-05 [PTadmin] Official Update 2010-01
// 
// 
// 1 16 0 0 0 1 0 0 0 1 0 0 0 1 4-4edge.dat
  [1,16,0,0,0,1,0,0,0,1,0,0,0,1, ldraw_lib__4_4edge()],
// 1 16 0 1 0 1 0 0 0 1 0 0 0 1 4-4edge.dat
  [1,16,0,1,0,1,0,0,0,1,0,0,0,1, ldraw_lib__4_4edge()],
// 1 16 0 0 0 1 0 0 0 1 0 0 0 1 4-4cyli.dat
  [1,16,0,0,0,1,0,0,0,1,0,0,0,1, ldraw_lib__4_4cyli()],
// 0
];
makepoly(ldraw_lib__4_4cylo(), line=0.2);
// file: ../p/1-16chrd.scad
use <../lib.scad>
use <empty.scad>
function ldraw_lib__1_16chrd() = [
// 0 Chord 0.0625
// 0 Name: 1-16chrd.dat
// 0 Author: Philippe Hurbain [Philo]
// 0 !LDRAW_ORG Primitive UPDATE 2015-01
// 0 !LICENSE Licensed under CC BY 2.0 and CC BY 4.0 : see CAreadme.txt
// 
// 0 BFC CERTIFY CCW
  [0,"BFC","CERTIFY"],
  [0,"BFC","CCW"],
// 
// 0 !HISTORY 2015-10-11 [PTadmin] Official Update 2015-01
// 
// 
// 0 // This file is intentionally empty because at the current \P resolution,
// 0 // an 1-16chrd is actually empty. However, this file still is present
// 0 // to allow tools to do primitives substition and fill in a real chrd here,
// 0 // or, if desired, to substitute this with the hi-res 48\1-16chrd.
// 
// 0 // This file is based on an idea by Darats at http://forums.ldraw.org/read.php?19,14500,14500#msg-14500
// 
// 1 16 0 0 0 1 0 0 0 1 0 0 0 1 empty.dat
  [1,16,0,0,0,1,0,0,0,1,0,0,0,1, ldraw_lib__empty()],
];
makepoly(ldraw_lib__1_16chrd(), line=0.2);
// file: s/98138s02.scad
use <../../lib.scad>
use <../../p/4-4cylo.scad>
use <../../p/4-4ring8.scad>
use <../../p/4-4ring9.scad>
use <../../p/stud4o.scad>
function ldraw_lib__s__98138s02() = [
// 0 ~Tile  1 x  1 Round with Groove without Complete Top Face
// 0 Name: s\98138s02.dat
// 0 Author: Magnus Forsberg [MagFors]
// 0 !LDRAW_ORG Subpart UPDATE 2020-01
// 0 !LICENSE Licensed under CC BY 2.0 and CC BY 4.0 : see CAreadme.txt
// 
// 0 BFC CERTIFY CCW
  [0,"BFC","CERTIFY"],
  [0,"BFC","CCW"],
// 
// 0 !HISTORY 2020-06-28 [PTadmin] Official Update 2020-01
// 
// 
// 1 16 0 4 0 1 0 0 0 -1 0 0 0 1 stud4o.dat
  [1,16,0,4,0,1,0,0,0,-1,0,0,0,1, ldraw_lib__stud4o()],
// 1 16 0 8 0 -1 0 0 0 -1 0 0 0 1 4-4ring8.dat
  [1,16,0,8,0,-1,0,0,0,-1,0,0,0,1, ldraw_lib__4_4ring8()],
// 1 16 0 7 0 9 0 0 0 1 0 0 0 9 4-4cylo.dat
  [1,16,0,7,0,9,0,0,0,1,0,0,0,9, ldraw_lib__4_4cylo()],
// 1 16 0 7 0 -1 0 0 0 -1 0 0 0 1 4-4ring9.dat
  [1,16,0,7,0,-1,0,0,0,-1,0,0,0,1, ldraw_lib__4_4ring9()],
// 1 16 0 0 0 10 0 0 0 7 0 0 0 10 4-4cylo.dat
  [1,16,0,0,0,10,0,0,0,7,0,0,0,10, ldraw_lib__4_4cylo()],
];
makepoly(ldraw_lib__s__98138s02(), line=0.2);
// file: ../p/7-16ndis.scad
use <../lib.scad>
function ldraw_lib__7_16ndis() = [
// 0 Disc Negative 0.4375
// 0 Name: 7-16ndis.dat
// 0 Author: Alex Taylor [anathema]
// 0 !LDRAW_ORG Primitive UPDATE 2010-01
// 0 !LICENSE Licensed under CC BY 2.0 and CC BY 4.0 : see CAreadme.txt
// 
// 0 BFC CERTIFY CCW
  [0,"BFC","CERTIFY"],
  [0,"BFC","CCW"],
// 
// 0 !HISTORY 2010-04-05 [PTadmin] Official Update 2010-01
// 
// 
// 3 16 1 0 1 0.9239 0 0.3827 1 0 0
  [3,16,1,0,1,0.9239,0,0.3827,1,0,0],
// 3 16 1 0 1 0.7071 0 0.7071 0.9239 0 0.3827
  [3,16,1,0,1,0.7071,0,0.7071,0.9239,0,0.3827],
// 3 16 1 0 1 0.3827 0 0.9239 0.7071 0 0.7071
  [3,16,1,0,1,0.3827,0,0.9239,0.7071,0,0.7071],
// 3 16 1 0 1 0 0 1 0.3827 0 0.9239
  [3,16,1,0,1,0,0,1,0.3827,0,0.9239],
// 3 16 -1 0 1 -0.3827 0 0.9239 0 0 1
  [3,16,-1,0,1,-0.3827,0,0.9239,0,0,1],
// 3 16 -1 0 1 -0.7071 0 0.7071 -0.3827 0 0.9239
  [3,16,-1,0,1,-0.7071,0,0.7071,-0.3827,0,0.9239],
// 3 16 -1 0 1 -0.9239 0 0.3827 -0.7071 0 0.7071
  [3,16,-1,0,1,-0.9239,0,0.3827,-0.7071,0,0.7071],
// 0
];
makepoly(ldraw_lib__7_16ndis(), line=0.2);
// file: ../p/7-16chrd.scad
use <../lib.scad>
function ldraw_lib__7_16chrd() = [
// 0 Chord 0.4375
// 0 Name: 7-16chrd.dat
// 0 Author: Guy Vivan [guyvivan]
// 0 !LDRAW_ORG Primitive UPDATE 2009-03
// 0 !LICENSE Licensed under CC BY 2.0 and CC BY 4.0 : see CAreadme.txt
// 
// 0 BFC CERTIFY CCW
  [0,"BFC","CERTIFY"],
  [0,"BFC","CCW"],
// 
// 0 !HISTORY 2009-12-29 [PTadmin] Official Update 2009-03
// 
// 
// 3 16 0.7071 0 0.7071 0.3827 0 0.9239 0 0 1
  [3,16,0.7071,0,0.7071,0.3827,0,0.9239,0,0,1],
// 4 16 0.7071 0 0.7071 0 0 1 -0.3827 0 0.9239 0.9239 0 0.3827
  [4,16,0.7071,0,0.7071,0,0,1,-0.3827,0,0.9239,0.9239,0,0.3827],
// 4 16 0.9239 0 0.3827 -0.3827 0 0.9239 -0.7071 0 0.7071 1 0 0
  [4,16,0.9239,0,0.3827,-0.3827,0,0.9239,-0.7071,0,0.7071,1,0,0],
// 3 16 -0.7071 0 0.7071 -0.9239 0 0.3827 1 0 0
  [3,16,-0.7071,0,0.7071,-0.9239,0,0.3827,1,0,0],
// 0
];
makepoly(ldraw_lib__7_16chrd(), line=0.2);
// file: ../p/4-4ering.scad
use <../lib.scad>
use <1-16chrd.scad>
function ldraw_lib__4_4ering() = [
// 0 Adapter Ring Triangles to Normal 1.0
// 0 Name: 4-4ering.dat
// 0 Author: Philippe Hurbain [Philo]
// 0 !LDRAW_ORG Primitive UPDATE 2015-01
// 0 !LICENSE Licensed under CC BY 2.0 and CC BY 4.0 : see CAreadme.txt
// 
// 0 BFC CERTIFY CCW
  [0,"BFC","CERTIFY"],
  [0,"BFC","CCW"],
// 
// 0 !HISTORY 2015-10-11 [PTadmin] Official Update 2015-01
// 
// 
// 0 // This file uses 1-16chrd (actually empty). It allows
// 0 // tools to do primitives substition and fill in a ring of chrd here,
// 0 // or, if desired, to substitute this with the hi-res 48\1-16chrd.
// 0 // This file is based on an idea by Darats at http://forums.ldraw.org/read.php?19,14500,14500#msg-14500
// 
// 1 16 0 0 0 1 0 0 0 1 0 0 0 1 1-16chrd.dat
  [1,16,0,0,0,1,0,0,0,1,0,0,0,1, ldraw_lib__1_16chrd()],
// 1 16 0 0 0 0.92388 0 0.38268 0 1 0 -0.38268 0 0.92388 1-16chrd.dat
  [1,16,0,0,0,0.92388,0,0.38268,0,1,0,-0.38268,0,0.92388, ldraw_lib__1_16chrd()],
// 1 16 0 0 0 0.70711 0 0.70711 0 1 0 -0.70711 0 0.70711 1-16chrd.dat
  [1,16,0,0,0,0.70711,0,0.70711,0,1,0,-0.70711,0,0.70711, ldraw_lib__1_16chrd()],
// 1 16 0 0 0 0.38268 0 0.92388 0 1 0 -0.92388 0 0.38268 1-16chrd.dat
  [1,16,0,0,0,0.38268,0,0.92388,0,1,0,-0.92388,0,0.38268, ldraw_lib__1_16chrd()],
// 1 16 0 0 0 0 0 1 0 1 0 -1 0 0 1-16chrd.dat
  [1,16,0,0,0,0,0,1,0,1,0,-1,0,0, ldraw_lib__1_16chrd()],
// 1 16 0 0 0 -0.38268 0 0.92388 0 1 0 -0.92388 0 -0.38268 1-16chrd.dat
  [1,16,0,0,0,-0.38268,0,0.92388,0,1,0,-0.92388,0,-0.38268, ldraw_lib__1_16chrd()],
// 1 16 0 0 0 -0.70711 0 0.70711 0 1 0 -0.70711 0 -0.70711 1-16chrd.dat
  [1,16,0,0,0,-0.70711,0,0.70711,0,1,0,-0.70711,0,-0.70711, ldraw_lib__1_16chrd()],
// 1 16 0 0 0 -0.92388 0 0.38268 0 1 0 -0.38268 0 -0.92388 1-16chrd.dat
  [1,16,0,0,0,-0.92388,0,0.38268,0,1,0,-0.38268,0,-0.92388, ldraw_lib__1_16chrd()],
// 1 16 0 0 0 0 0 -1 0 1 0 1 0 0 1-16chrd.dat
  [1,16,0,0,0,0,0,-1,0,1,0,1,0,0, ldraw_lib__1_16chrd()],
// 1 16 0 0 0 0.38268 0 -0.92388 0 1 0 0.92388 0 0.38268 1-16chrd.dat
  [1,16,0,0,0,0.38268,0,-0.92388,0,1,0,0.92388,0,0.38268, ldraw_lib__1_16chrd()],
// 1 16 0 0 0 0.70711 0 -0.70711 0 1 0 0.70711 0 0.70711 1-16chrd.dat
  [1,16,0,0,0,0.70711,0,-0.70711,0,1,0,0.70711,0,0.70711, ldraw_lib__1_16chrd()],
// 1 16 0 0 0 0.92388 0 -0.38268 0 1 0 0.38268 0 0.92388 1-16chrd.dat
  [1,16,0,0,0,0.92388,0,-0.38268,0,1,0,0.38268,0,0.92388, ldraw_lib__1_16chrd()],
// 1 16 0 0 0 -1 0 0 0 1 0 0 0 -1 1-16chrd.dat
  [1,16,0,0,0,-1,0,0,0,1,0,0,0,-1, ldraw_lib__1_16chrd()],
// 1 16 0 0 0 -0.92388 0 -0.38268 0 1 0 0.38268 0 -0.92388 1-16chrd.dat
  [1,16,0,0,0,-0.92388,0,-0.38268,0,1,0,0.38268,0,-0.92388, ldraw_lib__1_16chrd()],
// 1 16 0 0 0 -0.70711 0 -0.70711 0 1 0 0.70711 0 -0.70711 1-16chrd.dat
  [1,16,0,0,0,-0.70711,0,-0.70711,0,1,0,0.70711,0,-0.70711, ldraw_lib__1_16chrd()],
// 1 16 0 0 0 -0.38268 0 -0.92388 0 1 0 0.92388 0 -0.38268 1-16chrd.dat
  [1,16,0,0,0,-0.38268,0,-0.92388,0,1,0,0.92388,0,-0.38268, ldraw_lib__1_16chrd()],
];
makepoly(ldraw_lib__4_4ering(), line=0.2);
// file: ../p/2-4ndis.scad
use <../lib.scad>
function ldraw_lib__2_4ndis() = [
// 0 Disc Negative 0.5
// 0 Name: 2-4ndis.dat
// 0 Author: James Jessiman
// 0 !LDRAW_ORG Primitive UPDATE 2012-01
// 0 !LICENSE Licensed under CC BY 2.0 and CC BY 4.0 : see CAreadme.txt
// 
// 0 BFC CERTIFY CCW
  [0,"BFC","CERTIFY"],
  [0,"BFC","CCW"],
// 
// 0 !HISTORY 2002-03-23 [sbliss] Added BFC statement; compacted code
// 0 !HISTORY 2002-04-25 [PTadmin] Official Update 2002-02
// 0 !HISTORY 2007-06-24 [PTadmin] Header formatted for Contributor Agreement
// 0 !HISTORY 2008-07-01 [PTadmin] Official Update 2008-01
// 0 !HISTORY 2012-02-16 [Philo] Changed to CCW
// 0 !HISTORY 2012-03-30 [PTadmin] Official Update 2012-01
// 
// 
// 3 16 0.9239 0 0.3827 1 0 0 1 0 1
  [3,16,0.9239,0,0.3827,1,0,0,1,0,1],
// 3 16 0.7071 0 0.7071 0.9239 0 0.3827 1 0 1
  [3,16,0.7071,0,0.7071,0.9239,0,0.3827,1,0,1],
// 3 16 0.3827 0 0.9239 0.7071 0 0.7071 1 0 1
  [3,16,0.3827,0,0.9239,0.7071,0,0.7071,1,0,1],
// 3 16 0 0 1 0.3827 0 0.9239 1 0 1
  [3,16,0,0,1,0.3827,0,0.9239,1,0,1],
// 3 16 -0.3827 0 0.9239 0 0 1 -1 0 1
  [3,16,-0.3827,0,0.9239,0,0,1,-1,0,1],
// 3 16 -0.7071 0 0.7071 -0.3827 0 0.9239 -1 0 1
  [3,16,-0.7071,0,0.7071,-0.3827,0,0.9239,-1,0,1],
// 3 16 -0.9239 0 0.3827 -0.7071 0 0.7071 -1 0 1
  [3,16,-0.9239,0,0.3827,-0.7071,0,0.7071,-1,0,1],
// 3 16 -1 0 0 -0.9239 0 0.3827 -1 0 1
  [3,16,-1,0,0,-0.9239,0,0.3827,-1,0,1],
];
makepoly(ldraw_lib__2_4ndis(), line=0.2);
// file: ../p/2-4chrd.scad
use <../lib.scad>
function ldraw_lib__2_4chrd() = [
// 0 Chord 0.5
// 0 Name: 2-4chrd.dat
// 0 Author: Philippe Hurbain [Philo]
// 0 !LDRAW_ORG Primitive UPDATE 2014-01
// 0 !LICENSE Licensed under CC BY 2.0 and CC BY 4.0 : see CAreadme.txt
// 
// 0 BFC CERTIFY CCW
  [0,"BFC","CERTIFY"],
  [0,"BFC","CCW"],
// 
// 0 !HISTORY 2014-06-21 [PTadmin] Official Update 2014-01
// 
// 
// 4 16 0.9239 0 0.3827 -0.9239 0 0.3827 -1 0 0 1 0 0
  [4,16,0.9239,0,0.3827,-0.9239,0,0.3827,-1,0,0,1,0,0],
// 4 16 0.7071 0 0.7071 -0.7071 0 0.7071 -0.9239 0 0.3827 0.9239 0 0.3827
  [4,16,0.7071,0,0.7071,-0.7071,0,0.7071,-0.9239,0,0.3827,0.9239,0,0.3827],
// 4 16 0.3827 0 0.9239 -0.3827 0 0.9239 -0.7071 0 0.7071 0.7071 0 0.7071
  [4,16,0.3827,0,0.9239,-0.3827,0,0.9239,-0.7071,0,0.7071,0.7071,0,0.7071],
// 3 16 0 0 1 -0.3827 0 0.9239 0.3827 0 0.9239
  [3,16,0,0,1,-0.3827,0,0.9239,0.3827,0,0.9239],
];
makepoly(ldraw_lib__2_4chrd(), line=0.2);
// main file
use <../lib.scad>
use <../p/2-4chrd.scad>
use <../p/2-4ndis.scad>
use <../p/4-4ering.scad>
use <../p/7-16chrd.scad>
use <../p/7-16ndis.scad>
use <s/98138s02.scad>
function ldraw_lib__98138p2c() = [
// 0 Tile  1 x  1 Round with Abstract Black Eye and Lid Half Closed Pattern
// 0 Name: 98138p2c.dat
// 0 Author: Gerald Lasser [GeraldLasser]
// 0 !LDRAW_ORG Part UPDATE 2022-05
// 0 !LICENSE Licensed under CC BY 2.0 and CC BY 4.0 : see CAreadme.txt
// 
// 0 BFC CERTIFY CCW
  [0,"BFC","CERTIFY"],
  [0,"BFC","CCW"],
// 
// 0 !KEYWORDS Bricklink 98138pb253, Dots, Set 41937, Set 41939
// 
// 0 !CMDLINE -c228
// 
// 0 !HISTORY 2022-09-15 [PTadmin] Official Update 2022-05
// 
// 
// 1 16 0 0 0 1 0 0 0 1 0 0 0 1 s\98138s02.dat
  [1,16,0,0,0,1,0,0,0,1,0,0,0,1, ldraw_lib__s__98138s02()],
// 1 16 0 0 0 10 0 0 0 1 0 0 0 10 4-4ering.dat
  [1,16,0,0,0,10,0,0,0,1,0,0,0,10, ldraw_lib__4_4ering()],
// 
// 1 0 0 0 -2.4 4 0 0 0 1 0 0 0 -4 2-4chrd.dat
  [1,0,0,0,-2.4,4,0,0,0,1,0,0,0,-4, ldraw_lib__2_4chrd()],
// 1 16 0 0 -2.4 4 0 0 0 1 0 0 0 -4 2-4ndis.dat
  [1,16,0,0,-2.4,4,0,0,0,1,0,0,0,-4, ldraw_lib__2_4ndis()],
// 
// 1 0 3.7 0 3.3 0 0 1.6 0 1 0 1.6 0 0 7-16chrd.dat
  [1,0,3.7,0,3.3,0,0,1.6,0,1,0,1.6,0,0, ldraw_lib__7_16chrd()],
// 1 16 3.7 0 3.3 0 0 1.6 0 1 0 1.6 0 0 7-16ndis.dat
  [1,16,3.7,0,3.3,0,0,1.6,0,1,0,1.6,0,0, ldraw_lib__7_16ndis()],
// 1 0 -3.7 0 3.3 0 0 -1.6 0 1 0 1.6 0 0 7-16chrd.dat
  [1,0,-3.7,0,3.3,0,0,-1.6,0,1,0,1.6,0,0, ldraw_lib__7_16chrd()],
// 1 16 -3.7 0 3.3 0 0 -1.6 0 1 0 1.6 0 0 7-16ndis.dat
  [1,16,-3.7,0,3.3,0,0,-1.6,0,1,0,1.6,0,0, ldraw_lib__7_16ndis()],
// 4 0 -4 0 1.7597 -4 0 -2.4 4 0 -2.4 4 0 1.7597
  [4,0,-4,0,1.7597,-4,0,-2.4,4,0,-2.4,4,0,1.7597],
// 3 0 -4.31232 0 1.82176 -4 0 1.7597 -3.7 0 4.9
  [3,0,-4.31232,0,1.82176,-4,0,1.7597,-3.7,0,4.9],
// 3 0 4 0 1.7597 4.31232 0 1.82176 3.7 0 4.9
  [3,0,4,0,1.7597,4.31232,0,1.82176,3.7,0,4.9],
// 4 0 -4 0 1.7597 4 0 1.7597 3.7 0 4.9 -3.7 0 4.9
  [4,0,-4,0,1.7597,4,0,1.7597,3.7,0,4.9,-3.7,0,4.9],
// 
// 4 16 5.3 0 1.7 4.31232 0 1.82176 4 0 1.7597 4 0 -2.4
  [4,16,5.3,0,1.7,4.31232,0,1.82176,4,0,1.7597,4,0,-2.4],
// 4 16 10 0 0 5.3 0 1.7 4 0 -2.4 9.239 0 -3.827
  [4,16,10,0,0,5.3,0,1.7,4,0,-2.4,9.239,0,-3.827],
// 4 16 7.071 0 -7.071 9.239 0 -3.827 4 0 -2.4 4 0 -6.4
  [4,16,7.071,0,-7.071,9.239,0,-3.827,4,0,-2.4,4,0,-6.4],
// 4 16 7.071 0 -7.071 4 0 -6.4 0 0 -6.4 3.827 0 -9.239
  [4,16,7.071,0,-7.071,4,0,-6.4,0,0,-6.4,3.827,0,-9.239],
// 4 16 0 0 -10 3.827 0 -9.239 0 0 -6.4 -3.827 0 -9.239
  [4,16,0,0,-10,3.827,0,-9.239,0,0,-6.4,-3.827,0,-9.239],
// 4 16 -3.827 0 -9.239 0 0 -6.4 -4 0 -6.4 -7.071 0 -7.071
  [4,16,-3.827,0,-9.239,0,0,-6.4,-4,0,-6.4,-7.071,0,-7.071],
// 4 16 -7.071 0 -7.071 -4 0 -6.4 -4 0 -2.4 -9.239 0 -3.827
  [4,16,-7.071,0,-7.071,-4,0,-6.4,-4,0,-2.4,-9.239,0,-3.827],
// 4 16 -4 0 1.7597 -4.31232 0 1.82176 -5.3 0 1.7 -4 0 -2.4
  [4,16,-4,0,1.7597,-4.31232,0,1.82176,-5.3,0,1.7,-4,0,-2.4],
// 4 16 -9.239 0 -3.827 -4 0 -2.4 -5.3 0 1.7 -10 0 0
  [4,16,-9.239,0,-3.827,-4,0,-2.4,-5.3,0,1.7,-10,0,0],
// 4 16 -9.239 0 3.827 -10 0 0 -5.3 0 1.7 -5.3 0 3.3
  [4,16,-9.239,0,3.827,-10,0,0,-5.3,0,1.7,-5.3,0,3.3],
// 4 16 -9.239 0 3.827 -5.3 0 3.3 -5.3 0 4.9 -7.071 0 7.071
  [4,16,-9.239,0,3.827,-5.3,0,3.3,-5.3,0,4.9,-7.071,0,7.071],
// 4 16 -5.3 0 4.9 -3.7 0 4.9 -3.827 0 9.239 -7.071 0 7.071
  [4,16,-5.3,0,4.9,-3.7,0,4.9,-3.827,0,9.239,-7.071,0,7.071],
// 4 16 -3.827 0 9.239 -3.7 0 4.9 3.7 0 4.9 3.827 0 9.239
  [4,16,-3.827,0,9.239,-3.7,0,4.9,3.7,0,4.9,3.827,0,9.239],
// 4 16 7.071 0 7.071 3.827 0 9.239 3.7 0 4.9 5.3 0 4.9
  [4,16,7.071,0,7.071,3.827,0,9.239,3.7,0,4.9,5.3,0,4.9],
// 4 16 9.239 0 3.827 7.071 0 7.071 5.3 0 4.9 5.3 0 3.3
  [4,16,9.239,0,3.827,7.071,0,7.071,5.3,0,4.9,5.3,0,3.3],
// 4 16 10 0 0 9.239 0 3.827 5.3 0 3.3 5.3 0 1.7
  [4,16,10,0,0,9.239,0,3.827,5.3,0,3.3,5.3,0,1.7],
// 3 16 0 0 10 -3.827 0 9.239 3.827 0 9.239
  [3,16,0,0,10,-3.827,0,9.239,3.827,0,9.239],
];
makepoly(ldraw_lib__98138p2c(), line=0.2);
